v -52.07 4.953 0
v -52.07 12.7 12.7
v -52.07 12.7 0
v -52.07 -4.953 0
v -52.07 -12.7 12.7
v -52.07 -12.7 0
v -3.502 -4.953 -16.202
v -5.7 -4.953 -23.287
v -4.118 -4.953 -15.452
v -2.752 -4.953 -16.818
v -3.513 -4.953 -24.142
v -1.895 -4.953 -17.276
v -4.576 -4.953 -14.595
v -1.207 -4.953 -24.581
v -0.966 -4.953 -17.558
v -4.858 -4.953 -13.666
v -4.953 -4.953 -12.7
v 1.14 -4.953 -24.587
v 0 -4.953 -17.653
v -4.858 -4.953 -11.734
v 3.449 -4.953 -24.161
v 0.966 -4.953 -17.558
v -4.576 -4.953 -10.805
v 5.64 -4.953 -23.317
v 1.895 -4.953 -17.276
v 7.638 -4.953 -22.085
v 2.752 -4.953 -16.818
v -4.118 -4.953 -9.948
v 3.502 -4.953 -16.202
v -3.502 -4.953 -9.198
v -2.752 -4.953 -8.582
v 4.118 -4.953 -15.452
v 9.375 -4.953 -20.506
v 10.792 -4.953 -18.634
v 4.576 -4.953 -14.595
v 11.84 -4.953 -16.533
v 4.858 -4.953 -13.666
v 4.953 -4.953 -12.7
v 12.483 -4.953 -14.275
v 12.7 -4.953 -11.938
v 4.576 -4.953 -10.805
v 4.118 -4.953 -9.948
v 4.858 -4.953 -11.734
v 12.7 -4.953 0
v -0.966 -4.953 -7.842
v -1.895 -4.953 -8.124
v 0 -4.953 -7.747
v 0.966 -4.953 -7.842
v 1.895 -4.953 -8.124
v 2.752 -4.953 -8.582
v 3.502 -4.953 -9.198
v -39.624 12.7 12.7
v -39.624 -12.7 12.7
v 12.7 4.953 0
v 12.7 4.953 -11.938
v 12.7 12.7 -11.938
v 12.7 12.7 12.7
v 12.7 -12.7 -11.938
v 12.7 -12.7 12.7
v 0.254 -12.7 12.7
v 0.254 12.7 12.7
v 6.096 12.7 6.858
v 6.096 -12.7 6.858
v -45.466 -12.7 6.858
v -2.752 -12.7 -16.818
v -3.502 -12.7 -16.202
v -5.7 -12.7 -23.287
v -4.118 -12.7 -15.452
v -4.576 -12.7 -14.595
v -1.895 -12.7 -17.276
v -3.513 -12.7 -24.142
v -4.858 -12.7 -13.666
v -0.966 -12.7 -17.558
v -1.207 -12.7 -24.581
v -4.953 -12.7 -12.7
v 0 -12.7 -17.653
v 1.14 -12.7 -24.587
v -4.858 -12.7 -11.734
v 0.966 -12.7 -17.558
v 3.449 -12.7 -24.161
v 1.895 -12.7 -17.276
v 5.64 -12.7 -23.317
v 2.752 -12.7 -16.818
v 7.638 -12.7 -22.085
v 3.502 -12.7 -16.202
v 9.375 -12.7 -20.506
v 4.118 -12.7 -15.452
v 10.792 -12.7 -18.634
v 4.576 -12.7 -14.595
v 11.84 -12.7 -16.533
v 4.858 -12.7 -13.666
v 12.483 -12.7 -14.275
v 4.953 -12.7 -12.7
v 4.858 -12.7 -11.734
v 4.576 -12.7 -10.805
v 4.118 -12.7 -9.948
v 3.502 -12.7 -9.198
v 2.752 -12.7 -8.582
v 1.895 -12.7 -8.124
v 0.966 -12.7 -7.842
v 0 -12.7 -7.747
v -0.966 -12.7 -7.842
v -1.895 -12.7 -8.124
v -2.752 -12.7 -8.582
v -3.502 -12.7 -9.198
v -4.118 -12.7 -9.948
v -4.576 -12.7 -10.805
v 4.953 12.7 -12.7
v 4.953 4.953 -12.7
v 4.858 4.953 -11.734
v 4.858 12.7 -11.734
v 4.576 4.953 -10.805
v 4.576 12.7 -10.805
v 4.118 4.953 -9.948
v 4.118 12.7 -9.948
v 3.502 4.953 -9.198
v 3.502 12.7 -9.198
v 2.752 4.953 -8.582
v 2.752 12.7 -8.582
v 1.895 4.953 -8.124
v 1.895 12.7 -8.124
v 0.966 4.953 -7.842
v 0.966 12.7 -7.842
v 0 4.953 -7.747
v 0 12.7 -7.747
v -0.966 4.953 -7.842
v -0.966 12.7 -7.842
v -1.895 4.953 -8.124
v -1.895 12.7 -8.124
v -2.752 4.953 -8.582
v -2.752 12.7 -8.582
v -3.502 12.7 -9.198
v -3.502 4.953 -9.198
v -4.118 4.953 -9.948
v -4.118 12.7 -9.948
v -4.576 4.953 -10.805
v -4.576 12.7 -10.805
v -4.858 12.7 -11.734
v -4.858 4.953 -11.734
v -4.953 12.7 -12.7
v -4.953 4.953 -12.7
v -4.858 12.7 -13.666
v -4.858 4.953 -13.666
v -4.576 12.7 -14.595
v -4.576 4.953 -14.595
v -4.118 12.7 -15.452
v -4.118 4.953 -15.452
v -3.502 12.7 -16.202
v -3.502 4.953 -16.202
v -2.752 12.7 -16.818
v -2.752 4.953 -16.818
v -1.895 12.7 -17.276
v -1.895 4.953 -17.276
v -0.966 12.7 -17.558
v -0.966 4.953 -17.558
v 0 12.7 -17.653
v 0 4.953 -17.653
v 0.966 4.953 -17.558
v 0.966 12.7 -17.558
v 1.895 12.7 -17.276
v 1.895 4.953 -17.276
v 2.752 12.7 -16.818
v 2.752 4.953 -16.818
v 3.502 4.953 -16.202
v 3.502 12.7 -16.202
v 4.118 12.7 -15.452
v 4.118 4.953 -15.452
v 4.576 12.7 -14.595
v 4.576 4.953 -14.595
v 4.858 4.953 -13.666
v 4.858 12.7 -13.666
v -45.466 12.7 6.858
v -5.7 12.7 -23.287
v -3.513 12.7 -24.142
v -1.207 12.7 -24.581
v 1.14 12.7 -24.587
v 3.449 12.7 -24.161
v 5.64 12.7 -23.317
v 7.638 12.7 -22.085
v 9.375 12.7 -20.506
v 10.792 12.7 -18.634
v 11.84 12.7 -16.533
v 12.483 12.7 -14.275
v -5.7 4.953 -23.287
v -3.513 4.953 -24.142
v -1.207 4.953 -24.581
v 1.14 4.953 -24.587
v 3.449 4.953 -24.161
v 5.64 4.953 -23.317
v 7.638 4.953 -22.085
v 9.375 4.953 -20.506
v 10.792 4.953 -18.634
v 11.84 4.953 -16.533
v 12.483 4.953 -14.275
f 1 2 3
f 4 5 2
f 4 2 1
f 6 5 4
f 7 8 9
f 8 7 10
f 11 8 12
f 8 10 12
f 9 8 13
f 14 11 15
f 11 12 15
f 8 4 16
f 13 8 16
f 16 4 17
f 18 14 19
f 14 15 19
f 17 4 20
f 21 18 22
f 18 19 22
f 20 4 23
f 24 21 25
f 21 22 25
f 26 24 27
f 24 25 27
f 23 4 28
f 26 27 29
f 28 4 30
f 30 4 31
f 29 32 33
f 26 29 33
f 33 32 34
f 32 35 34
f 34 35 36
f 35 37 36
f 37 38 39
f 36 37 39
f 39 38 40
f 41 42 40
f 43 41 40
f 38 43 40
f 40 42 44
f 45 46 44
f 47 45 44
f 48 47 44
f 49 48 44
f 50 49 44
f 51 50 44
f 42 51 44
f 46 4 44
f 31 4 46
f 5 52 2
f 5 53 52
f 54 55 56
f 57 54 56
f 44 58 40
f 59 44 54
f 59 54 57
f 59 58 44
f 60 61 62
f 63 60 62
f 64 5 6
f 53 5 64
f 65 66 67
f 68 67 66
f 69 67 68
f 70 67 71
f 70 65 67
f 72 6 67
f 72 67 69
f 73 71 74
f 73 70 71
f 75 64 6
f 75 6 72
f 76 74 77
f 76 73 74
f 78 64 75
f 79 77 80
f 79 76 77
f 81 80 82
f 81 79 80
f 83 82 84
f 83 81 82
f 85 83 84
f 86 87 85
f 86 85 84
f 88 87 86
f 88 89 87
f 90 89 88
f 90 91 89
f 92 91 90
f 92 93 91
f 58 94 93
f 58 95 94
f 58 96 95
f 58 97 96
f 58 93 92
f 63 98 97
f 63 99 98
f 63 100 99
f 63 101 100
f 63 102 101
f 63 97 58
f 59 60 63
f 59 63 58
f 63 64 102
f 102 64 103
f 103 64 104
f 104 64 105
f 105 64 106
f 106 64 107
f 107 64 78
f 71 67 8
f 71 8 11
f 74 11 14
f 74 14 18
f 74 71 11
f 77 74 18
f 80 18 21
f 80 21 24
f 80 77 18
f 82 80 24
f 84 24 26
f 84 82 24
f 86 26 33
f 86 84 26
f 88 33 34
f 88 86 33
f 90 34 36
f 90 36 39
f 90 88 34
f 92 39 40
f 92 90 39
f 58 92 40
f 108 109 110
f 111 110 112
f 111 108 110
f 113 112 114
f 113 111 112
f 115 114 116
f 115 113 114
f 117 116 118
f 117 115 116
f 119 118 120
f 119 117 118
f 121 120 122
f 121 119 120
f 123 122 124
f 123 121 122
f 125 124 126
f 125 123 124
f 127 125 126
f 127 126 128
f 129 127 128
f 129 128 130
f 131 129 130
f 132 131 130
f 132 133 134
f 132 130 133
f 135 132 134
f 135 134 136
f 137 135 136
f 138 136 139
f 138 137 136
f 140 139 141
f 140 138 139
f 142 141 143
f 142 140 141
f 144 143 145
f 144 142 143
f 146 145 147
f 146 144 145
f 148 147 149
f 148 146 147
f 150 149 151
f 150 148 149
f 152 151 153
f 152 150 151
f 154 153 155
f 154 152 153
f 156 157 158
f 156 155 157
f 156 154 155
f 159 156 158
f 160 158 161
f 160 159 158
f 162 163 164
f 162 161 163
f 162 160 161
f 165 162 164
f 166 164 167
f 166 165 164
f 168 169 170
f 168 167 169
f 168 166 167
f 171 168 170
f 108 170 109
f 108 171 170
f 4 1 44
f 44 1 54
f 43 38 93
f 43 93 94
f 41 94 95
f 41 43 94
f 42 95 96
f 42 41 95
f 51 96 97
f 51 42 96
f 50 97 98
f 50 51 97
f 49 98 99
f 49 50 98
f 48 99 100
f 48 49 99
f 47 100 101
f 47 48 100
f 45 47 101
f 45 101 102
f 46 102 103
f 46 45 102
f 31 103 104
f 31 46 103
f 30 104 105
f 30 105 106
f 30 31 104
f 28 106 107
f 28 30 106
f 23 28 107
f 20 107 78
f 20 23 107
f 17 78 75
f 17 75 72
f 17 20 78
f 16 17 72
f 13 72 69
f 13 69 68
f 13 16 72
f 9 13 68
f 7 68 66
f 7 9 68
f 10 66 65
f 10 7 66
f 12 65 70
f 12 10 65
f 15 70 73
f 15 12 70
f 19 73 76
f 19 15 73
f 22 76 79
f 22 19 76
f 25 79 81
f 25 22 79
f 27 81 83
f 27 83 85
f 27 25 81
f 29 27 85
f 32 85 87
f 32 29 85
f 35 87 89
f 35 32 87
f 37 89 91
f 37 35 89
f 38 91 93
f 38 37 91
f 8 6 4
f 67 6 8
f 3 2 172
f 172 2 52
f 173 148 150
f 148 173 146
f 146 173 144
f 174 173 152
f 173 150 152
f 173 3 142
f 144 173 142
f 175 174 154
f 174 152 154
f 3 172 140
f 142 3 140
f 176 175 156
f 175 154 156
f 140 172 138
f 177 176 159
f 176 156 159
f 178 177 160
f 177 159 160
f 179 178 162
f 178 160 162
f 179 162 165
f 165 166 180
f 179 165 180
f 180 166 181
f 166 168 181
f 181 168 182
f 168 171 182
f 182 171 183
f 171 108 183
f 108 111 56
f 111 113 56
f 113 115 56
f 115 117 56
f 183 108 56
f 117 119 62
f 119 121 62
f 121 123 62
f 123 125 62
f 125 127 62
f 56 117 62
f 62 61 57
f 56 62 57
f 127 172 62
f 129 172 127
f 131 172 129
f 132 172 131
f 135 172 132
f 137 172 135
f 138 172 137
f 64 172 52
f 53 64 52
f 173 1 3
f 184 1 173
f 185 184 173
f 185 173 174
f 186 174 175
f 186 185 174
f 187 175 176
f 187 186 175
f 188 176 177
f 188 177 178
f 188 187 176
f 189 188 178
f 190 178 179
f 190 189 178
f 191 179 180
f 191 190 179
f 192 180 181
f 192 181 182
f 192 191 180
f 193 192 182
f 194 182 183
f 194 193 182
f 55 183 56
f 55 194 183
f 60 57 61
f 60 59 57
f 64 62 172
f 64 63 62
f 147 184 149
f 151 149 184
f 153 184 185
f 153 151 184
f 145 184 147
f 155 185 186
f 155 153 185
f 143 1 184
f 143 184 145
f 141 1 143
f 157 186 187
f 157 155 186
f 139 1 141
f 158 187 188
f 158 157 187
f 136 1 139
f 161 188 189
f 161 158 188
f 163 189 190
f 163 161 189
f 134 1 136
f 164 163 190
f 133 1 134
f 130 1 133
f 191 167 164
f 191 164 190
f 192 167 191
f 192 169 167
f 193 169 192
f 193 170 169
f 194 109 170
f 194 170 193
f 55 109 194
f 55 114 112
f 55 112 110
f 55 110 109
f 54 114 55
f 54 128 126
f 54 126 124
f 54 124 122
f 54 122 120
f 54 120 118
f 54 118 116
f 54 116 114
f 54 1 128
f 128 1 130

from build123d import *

# Parameters (mm, degrees)
F0_R     = 4.953
F1_DEPTH = 12.7
F2_W     = 64.77
F2_H     = 9.906
F3_DEPTH = 24.639


with BuildPart() as f1:
    # F0 (on Front) → F1 (new body, symmetric)
    with BuildSketch(Plane.XZ):
        with BuildLine():
            Line((-39.624, 12.7), (-52.07, 12.7))
            Line((-52.07, 12.7), (-52.07, 0))
            Line((-52.07, 0), (-5.699577, -23.287221))
            ThreePointArc((-5.699577, -23.287221), (6.667285, -22.747131), (12.7, -11.938))
            Line((12.7, -11.938), (12.7, 0))
            Line((12.7, 0), (12.7, 12.7))
            Line((12.7, 12.7), (0.254, 12.7))
            Line((0.254, 12.7), (6.096, 6.858))
            Line((6.096, 6.858), (-45.466, 6.858))
            Line((-45.466, 6.858), (-39.624, 12.7))
        make_face()
        with Locations((0, -12.7)):
            Circle(F0_R, mode=Mode.SUBTRACT)
    extrude(amount=F1_DEPTH, both=True)

    # F2 (on Top) → F3 (cut, through all)
    with BuildSketch(Plane.XY):
        with Locations((-19.685, 0)):
            Rectangle(F2_W, F2_H)
    extrude(amount=-F3_DEPTH, mode=Mode.SUBTRACT)


solid = f1.part
